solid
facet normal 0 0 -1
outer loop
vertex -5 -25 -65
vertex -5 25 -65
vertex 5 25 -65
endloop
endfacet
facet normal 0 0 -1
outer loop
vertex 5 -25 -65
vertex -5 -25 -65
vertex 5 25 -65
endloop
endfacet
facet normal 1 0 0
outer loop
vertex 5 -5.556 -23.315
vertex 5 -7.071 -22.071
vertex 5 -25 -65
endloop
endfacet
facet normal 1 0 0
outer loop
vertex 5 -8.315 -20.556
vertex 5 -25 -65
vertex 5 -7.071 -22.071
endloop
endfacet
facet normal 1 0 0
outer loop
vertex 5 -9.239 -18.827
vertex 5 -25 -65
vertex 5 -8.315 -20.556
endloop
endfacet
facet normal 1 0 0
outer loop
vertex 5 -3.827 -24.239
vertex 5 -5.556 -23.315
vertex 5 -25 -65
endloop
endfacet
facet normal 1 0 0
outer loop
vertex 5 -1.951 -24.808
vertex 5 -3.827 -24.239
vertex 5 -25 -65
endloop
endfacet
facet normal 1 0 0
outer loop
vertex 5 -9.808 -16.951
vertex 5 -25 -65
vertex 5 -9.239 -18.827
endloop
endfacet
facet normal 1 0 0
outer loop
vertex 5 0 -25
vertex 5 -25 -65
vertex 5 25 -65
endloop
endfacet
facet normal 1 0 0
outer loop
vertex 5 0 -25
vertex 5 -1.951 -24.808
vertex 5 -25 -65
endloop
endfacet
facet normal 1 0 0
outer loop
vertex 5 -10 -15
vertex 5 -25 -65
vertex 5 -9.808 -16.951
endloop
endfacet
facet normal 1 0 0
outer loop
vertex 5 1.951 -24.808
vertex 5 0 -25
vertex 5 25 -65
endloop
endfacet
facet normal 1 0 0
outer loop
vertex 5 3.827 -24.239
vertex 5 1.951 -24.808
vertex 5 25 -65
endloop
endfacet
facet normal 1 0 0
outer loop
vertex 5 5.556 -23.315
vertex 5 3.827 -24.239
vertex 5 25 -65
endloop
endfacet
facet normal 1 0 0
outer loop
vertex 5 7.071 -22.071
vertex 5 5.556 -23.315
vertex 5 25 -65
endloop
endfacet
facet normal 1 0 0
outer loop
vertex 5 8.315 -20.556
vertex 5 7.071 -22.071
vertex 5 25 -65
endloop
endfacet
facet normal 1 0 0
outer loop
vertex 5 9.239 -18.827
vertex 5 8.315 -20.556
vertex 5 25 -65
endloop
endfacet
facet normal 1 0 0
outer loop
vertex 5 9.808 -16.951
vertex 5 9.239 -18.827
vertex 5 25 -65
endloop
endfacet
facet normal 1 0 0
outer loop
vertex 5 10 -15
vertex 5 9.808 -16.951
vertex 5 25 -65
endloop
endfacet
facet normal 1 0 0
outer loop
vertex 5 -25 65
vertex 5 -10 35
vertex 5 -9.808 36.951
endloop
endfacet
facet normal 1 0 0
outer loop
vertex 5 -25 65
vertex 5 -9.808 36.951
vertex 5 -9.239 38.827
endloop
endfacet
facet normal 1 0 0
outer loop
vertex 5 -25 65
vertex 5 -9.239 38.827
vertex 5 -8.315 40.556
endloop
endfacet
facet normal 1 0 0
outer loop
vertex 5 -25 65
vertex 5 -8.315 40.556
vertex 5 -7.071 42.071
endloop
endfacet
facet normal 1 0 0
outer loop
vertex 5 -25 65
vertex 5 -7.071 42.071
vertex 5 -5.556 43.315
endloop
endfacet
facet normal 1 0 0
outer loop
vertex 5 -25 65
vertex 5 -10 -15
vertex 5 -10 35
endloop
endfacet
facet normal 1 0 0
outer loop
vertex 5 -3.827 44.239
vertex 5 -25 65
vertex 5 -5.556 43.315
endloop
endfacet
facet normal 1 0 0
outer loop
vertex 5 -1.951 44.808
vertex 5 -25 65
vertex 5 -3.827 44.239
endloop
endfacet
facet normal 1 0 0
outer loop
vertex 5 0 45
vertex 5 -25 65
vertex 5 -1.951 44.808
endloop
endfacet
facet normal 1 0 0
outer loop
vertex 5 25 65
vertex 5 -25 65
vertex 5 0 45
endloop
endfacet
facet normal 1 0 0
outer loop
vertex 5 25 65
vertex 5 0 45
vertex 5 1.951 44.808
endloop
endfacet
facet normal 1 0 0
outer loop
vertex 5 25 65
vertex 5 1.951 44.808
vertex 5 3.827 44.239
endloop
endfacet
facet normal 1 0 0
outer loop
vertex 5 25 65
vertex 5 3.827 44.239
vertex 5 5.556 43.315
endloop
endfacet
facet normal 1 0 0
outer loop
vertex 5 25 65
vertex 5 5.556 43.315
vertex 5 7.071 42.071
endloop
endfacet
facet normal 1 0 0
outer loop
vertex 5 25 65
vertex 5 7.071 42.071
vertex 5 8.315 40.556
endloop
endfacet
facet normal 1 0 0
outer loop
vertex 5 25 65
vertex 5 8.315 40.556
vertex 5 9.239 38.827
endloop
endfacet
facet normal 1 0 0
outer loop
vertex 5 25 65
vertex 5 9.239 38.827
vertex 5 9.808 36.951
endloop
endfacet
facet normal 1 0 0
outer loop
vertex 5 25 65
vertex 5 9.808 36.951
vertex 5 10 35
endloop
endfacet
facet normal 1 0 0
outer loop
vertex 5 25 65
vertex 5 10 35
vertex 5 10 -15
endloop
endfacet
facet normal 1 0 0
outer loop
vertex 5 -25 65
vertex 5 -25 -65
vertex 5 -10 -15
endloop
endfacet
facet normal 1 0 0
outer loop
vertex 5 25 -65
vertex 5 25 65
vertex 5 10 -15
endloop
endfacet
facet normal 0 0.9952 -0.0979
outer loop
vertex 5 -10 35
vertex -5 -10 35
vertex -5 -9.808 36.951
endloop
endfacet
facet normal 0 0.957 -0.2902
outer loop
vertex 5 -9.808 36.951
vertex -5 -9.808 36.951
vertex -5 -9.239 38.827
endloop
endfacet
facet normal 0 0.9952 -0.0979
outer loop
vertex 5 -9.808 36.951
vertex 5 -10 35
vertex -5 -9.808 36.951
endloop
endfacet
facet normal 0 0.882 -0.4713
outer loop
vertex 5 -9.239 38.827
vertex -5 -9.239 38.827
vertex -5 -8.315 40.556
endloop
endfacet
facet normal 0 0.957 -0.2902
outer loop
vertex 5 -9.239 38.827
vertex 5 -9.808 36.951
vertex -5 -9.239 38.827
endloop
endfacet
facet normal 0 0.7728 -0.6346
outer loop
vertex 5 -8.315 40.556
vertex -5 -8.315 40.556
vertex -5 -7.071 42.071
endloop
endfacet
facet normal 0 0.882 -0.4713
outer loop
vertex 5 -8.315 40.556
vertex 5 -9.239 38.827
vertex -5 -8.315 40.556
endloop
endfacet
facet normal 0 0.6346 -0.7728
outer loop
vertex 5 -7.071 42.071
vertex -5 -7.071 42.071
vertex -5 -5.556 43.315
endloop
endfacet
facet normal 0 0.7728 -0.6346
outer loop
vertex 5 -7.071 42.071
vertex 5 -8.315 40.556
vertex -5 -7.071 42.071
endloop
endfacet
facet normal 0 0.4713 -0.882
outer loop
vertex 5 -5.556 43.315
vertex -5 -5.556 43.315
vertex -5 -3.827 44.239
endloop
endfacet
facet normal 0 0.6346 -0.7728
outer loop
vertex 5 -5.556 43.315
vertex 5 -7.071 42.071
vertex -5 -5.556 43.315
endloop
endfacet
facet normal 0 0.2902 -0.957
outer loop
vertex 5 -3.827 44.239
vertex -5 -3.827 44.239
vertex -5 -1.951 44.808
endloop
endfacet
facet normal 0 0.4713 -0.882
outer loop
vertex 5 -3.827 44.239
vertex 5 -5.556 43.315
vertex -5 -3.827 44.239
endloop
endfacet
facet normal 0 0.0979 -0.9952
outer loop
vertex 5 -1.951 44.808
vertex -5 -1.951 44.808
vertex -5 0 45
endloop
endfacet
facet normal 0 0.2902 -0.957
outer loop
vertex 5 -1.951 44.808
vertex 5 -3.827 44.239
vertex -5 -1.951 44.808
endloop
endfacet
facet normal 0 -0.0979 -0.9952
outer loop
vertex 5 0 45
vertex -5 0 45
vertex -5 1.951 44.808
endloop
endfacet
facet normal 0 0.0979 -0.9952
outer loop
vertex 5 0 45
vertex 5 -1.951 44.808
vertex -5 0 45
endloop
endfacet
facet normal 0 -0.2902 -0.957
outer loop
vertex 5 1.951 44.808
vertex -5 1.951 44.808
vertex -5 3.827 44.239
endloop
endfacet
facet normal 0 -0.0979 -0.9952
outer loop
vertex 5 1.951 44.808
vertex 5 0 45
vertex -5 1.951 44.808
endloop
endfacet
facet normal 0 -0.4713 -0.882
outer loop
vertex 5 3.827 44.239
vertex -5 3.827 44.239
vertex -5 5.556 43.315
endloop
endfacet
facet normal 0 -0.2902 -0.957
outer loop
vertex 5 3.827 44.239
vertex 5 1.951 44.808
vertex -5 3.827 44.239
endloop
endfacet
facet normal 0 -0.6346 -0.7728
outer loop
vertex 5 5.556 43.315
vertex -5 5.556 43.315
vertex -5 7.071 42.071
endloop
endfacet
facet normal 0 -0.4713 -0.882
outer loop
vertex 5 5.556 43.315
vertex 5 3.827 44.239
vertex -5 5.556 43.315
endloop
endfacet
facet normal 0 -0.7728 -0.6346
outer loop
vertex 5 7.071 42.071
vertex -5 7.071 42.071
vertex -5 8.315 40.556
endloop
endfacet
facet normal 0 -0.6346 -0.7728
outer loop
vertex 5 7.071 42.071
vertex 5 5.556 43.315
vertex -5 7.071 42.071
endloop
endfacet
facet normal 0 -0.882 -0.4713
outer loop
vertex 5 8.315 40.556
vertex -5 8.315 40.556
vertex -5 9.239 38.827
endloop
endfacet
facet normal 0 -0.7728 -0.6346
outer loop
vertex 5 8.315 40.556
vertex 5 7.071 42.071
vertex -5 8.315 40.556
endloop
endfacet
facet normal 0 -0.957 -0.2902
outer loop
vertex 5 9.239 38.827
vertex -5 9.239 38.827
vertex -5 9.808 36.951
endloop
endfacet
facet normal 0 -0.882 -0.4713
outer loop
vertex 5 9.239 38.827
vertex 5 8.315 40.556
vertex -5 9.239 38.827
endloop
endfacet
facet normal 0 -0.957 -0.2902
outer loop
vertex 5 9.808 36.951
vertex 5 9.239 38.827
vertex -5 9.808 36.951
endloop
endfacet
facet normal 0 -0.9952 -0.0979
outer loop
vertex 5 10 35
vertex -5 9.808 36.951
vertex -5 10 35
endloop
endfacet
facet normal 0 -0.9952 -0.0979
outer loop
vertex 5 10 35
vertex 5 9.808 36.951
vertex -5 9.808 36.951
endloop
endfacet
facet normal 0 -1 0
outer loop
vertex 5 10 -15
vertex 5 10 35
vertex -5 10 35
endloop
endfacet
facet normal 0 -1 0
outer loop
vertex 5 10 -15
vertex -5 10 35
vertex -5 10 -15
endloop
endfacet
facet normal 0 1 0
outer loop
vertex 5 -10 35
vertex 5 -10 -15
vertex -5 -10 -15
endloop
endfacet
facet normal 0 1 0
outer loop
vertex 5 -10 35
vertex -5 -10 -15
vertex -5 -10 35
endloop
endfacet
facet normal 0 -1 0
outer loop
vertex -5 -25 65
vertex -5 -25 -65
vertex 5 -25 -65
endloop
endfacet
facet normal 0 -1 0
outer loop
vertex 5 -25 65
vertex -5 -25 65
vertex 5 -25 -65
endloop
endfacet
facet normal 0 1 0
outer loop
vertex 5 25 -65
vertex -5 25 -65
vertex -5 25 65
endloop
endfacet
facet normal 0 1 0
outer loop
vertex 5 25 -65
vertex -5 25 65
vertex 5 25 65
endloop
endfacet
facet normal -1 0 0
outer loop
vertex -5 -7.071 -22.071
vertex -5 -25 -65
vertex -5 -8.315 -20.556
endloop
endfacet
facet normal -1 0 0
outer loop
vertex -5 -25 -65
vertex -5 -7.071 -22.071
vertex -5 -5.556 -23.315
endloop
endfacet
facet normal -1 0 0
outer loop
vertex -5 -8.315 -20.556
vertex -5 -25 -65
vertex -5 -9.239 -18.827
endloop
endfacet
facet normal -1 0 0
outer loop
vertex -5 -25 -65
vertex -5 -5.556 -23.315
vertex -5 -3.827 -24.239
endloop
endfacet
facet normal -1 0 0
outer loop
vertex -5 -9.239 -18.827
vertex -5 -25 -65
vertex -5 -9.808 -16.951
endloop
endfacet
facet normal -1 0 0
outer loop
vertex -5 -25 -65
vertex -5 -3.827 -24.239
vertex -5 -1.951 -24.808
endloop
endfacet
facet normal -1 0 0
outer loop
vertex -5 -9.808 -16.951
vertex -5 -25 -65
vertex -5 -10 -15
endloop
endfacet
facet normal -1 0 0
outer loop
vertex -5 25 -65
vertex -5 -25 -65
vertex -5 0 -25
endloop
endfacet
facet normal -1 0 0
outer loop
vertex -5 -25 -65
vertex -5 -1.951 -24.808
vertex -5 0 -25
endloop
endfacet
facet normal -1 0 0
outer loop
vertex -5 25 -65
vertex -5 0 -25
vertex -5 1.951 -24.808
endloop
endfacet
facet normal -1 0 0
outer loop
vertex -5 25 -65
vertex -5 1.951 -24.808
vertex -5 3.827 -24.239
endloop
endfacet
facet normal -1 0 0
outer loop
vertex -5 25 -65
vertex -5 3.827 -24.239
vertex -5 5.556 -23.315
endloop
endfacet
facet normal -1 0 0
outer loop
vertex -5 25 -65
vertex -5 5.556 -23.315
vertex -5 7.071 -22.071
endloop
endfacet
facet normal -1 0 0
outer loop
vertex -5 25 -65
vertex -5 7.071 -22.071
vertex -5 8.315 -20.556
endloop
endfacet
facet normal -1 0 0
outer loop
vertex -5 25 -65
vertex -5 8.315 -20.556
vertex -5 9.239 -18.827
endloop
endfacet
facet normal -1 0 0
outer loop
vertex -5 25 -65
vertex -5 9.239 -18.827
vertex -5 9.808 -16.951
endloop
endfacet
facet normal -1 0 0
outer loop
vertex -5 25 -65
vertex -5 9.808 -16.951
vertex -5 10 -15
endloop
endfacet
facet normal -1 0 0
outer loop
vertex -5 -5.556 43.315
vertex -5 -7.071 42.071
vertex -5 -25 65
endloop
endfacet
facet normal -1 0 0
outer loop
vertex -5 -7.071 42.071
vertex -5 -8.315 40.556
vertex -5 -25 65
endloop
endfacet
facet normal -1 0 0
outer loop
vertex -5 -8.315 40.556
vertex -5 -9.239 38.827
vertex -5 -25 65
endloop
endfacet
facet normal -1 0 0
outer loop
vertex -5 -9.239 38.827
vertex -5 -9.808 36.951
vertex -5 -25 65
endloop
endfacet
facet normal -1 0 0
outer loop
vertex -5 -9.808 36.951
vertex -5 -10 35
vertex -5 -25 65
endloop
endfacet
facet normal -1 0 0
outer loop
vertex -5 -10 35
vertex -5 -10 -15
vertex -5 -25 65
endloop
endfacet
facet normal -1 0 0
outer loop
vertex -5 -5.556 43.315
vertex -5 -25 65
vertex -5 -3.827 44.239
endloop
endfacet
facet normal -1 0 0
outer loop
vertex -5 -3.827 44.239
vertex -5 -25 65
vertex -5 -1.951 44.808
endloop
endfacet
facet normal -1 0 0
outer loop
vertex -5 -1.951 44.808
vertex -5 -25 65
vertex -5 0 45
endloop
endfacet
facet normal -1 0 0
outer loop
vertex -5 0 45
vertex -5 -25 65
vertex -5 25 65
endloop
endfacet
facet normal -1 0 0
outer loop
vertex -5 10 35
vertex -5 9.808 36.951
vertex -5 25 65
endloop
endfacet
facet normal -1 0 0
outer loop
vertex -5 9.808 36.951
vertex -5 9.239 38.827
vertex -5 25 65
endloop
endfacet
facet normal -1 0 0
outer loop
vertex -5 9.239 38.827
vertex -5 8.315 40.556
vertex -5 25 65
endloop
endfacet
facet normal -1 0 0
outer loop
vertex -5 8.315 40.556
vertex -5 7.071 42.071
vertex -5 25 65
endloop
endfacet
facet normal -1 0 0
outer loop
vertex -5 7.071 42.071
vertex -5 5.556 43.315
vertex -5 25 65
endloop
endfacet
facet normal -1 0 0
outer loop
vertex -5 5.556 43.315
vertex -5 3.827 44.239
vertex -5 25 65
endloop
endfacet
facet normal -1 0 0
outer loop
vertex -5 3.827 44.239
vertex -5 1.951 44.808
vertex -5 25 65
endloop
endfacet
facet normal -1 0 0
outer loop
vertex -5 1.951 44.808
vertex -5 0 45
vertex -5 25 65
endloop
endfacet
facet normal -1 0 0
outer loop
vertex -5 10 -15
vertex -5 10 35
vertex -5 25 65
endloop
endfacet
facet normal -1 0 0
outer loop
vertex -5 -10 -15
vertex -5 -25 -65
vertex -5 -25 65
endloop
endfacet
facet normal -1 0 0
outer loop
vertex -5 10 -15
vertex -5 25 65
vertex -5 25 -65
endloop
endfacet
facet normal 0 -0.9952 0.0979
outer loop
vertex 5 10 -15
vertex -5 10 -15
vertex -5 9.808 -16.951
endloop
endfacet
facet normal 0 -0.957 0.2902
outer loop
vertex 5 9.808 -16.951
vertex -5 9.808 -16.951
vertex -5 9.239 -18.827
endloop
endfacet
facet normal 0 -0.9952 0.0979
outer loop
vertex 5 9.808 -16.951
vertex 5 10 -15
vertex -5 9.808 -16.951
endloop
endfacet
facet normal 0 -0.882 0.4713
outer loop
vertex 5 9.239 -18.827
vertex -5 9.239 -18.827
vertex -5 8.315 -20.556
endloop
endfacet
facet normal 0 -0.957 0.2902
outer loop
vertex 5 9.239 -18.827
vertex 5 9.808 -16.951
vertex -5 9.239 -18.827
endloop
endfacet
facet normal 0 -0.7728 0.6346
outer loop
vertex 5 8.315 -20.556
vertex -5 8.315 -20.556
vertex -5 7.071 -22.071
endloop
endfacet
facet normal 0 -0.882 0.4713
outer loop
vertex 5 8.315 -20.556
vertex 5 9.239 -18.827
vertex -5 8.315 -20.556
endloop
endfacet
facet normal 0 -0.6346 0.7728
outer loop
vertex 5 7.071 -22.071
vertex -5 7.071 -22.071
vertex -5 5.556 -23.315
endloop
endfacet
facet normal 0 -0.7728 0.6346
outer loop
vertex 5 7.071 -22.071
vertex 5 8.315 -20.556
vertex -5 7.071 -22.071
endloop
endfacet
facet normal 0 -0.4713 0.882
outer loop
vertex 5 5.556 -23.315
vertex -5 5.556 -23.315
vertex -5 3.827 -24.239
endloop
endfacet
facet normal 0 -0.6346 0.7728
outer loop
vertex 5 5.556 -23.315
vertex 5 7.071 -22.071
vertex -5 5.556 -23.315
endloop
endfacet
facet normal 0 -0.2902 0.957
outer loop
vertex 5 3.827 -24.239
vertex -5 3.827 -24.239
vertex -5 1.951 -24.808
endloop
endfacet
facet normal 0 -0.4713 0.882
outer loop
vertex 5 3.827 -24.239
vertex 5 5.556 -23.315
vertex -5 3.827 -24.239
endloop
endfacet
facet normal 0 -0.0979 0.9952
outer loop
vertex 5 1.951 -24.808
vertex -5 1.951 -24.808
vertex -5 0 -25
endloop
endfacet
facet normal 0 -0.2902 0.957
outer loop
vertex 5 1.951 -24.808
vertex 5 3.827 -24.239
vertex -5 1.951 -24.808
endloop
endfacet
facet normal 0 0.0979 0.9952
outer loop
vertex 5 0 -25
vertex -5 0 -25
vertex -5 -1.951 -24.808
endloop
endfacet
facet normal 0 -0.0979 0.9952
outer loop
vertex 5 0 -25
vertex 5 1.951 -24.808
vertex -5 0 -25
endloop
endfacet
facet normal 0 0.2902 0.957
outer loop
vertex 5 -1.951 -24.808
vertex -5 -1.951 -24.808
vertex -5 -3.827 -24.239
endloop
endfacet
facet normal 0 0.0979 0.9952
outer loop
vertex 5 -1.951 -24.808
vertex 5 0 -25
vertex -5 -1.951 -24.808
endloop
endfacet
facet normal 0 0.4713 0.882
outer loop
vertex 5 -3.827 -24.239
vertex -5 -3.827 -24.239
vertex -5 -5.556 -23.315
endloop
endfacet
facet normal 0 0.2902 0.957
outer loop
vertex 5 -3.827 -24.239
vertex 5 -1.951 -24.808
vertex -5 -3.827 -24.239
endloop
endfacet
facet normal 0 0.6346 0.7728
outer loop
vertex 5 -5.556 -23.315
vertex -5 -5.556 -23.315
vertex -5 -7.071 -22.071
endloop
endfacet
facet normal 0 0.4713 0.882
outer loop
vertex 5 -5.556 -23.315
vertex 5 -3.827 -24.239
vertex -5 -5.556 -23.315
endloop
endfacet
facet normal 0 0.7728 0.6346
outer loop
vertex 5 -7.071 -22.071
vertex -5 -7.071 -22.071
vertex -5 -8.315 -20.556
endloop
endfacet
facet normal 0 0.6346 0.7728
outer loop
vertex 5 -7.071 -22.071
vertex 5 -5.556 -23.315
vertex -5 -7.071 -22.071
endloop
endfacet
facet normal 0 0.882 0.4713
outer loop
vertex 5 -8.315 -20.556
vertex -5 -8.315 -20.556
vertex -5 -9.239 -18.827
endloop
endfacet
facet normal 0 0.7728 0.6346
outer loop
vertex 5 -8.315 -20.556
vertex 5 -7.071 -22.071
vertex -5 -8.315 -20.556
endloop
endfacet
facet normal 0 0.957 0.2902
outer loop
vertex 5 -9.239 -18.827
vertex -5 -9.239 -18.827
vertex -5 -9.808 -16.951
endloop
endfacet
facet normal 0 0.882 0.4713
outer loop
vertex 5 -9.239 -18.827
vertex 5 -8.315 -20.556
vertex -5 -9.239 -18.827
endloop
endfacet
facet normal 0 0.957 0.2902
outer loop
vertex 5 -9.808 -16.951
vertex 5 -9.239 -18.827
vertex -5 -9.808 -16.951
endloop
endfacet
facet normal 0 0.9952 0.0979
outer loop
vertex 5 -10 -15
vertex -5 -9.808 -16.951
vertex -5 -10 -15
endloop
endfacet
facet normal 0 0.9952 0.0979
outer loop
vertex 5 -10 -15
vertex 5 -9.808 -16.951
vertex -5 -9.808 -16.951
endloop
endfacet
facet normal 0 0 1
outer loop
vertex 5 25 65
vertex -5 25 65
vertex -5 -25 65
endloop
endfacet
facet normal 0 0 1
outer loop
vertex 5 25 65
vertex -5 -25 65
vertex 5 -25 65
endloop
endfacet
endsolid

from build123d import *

# Parameters (mm, degrees)
ESQUISSE1_W             = 10
ESQUISSE1_H             = 50
BOSS_EXTRU_1_DEPTH      = 65
ENL_V_MAT_EXTRU_1_DEPTH = 110


with BuildPart() as part:
    # Esquisse1 → Boss.-Extru.1 (new body, symmetric)
    with BuildSketch(Plane.XY):
        Rectangle(ESQUISSE1_W, ESQUISSE1_H)
    extrude(amount=BOSS_EXTRU_1_DEPTH, both=True)

    # Esquisse2 → Enlèv. mat.-Extru.1 (cut)
    with BuildSketch(Plane(origin=(5, 0, 0), x_dir=(0, 0, -1), z_dir=(1, 0, 0))):
        with BuildLine():
            Line((-35, 10), (15, 10))
            ThreePointArc((15, 10), (25, 0), (15, -10))
            Line((15, -10), (-35, -10))
            ThreePointArc((-35, -10), (-45, 0), (-35, 10))
        make_face()
    extrude(amount=-ENL_V_MAT_EXTRU_1_DEPTH, mode=Mode.SUBTRACT)


solid = part.part
